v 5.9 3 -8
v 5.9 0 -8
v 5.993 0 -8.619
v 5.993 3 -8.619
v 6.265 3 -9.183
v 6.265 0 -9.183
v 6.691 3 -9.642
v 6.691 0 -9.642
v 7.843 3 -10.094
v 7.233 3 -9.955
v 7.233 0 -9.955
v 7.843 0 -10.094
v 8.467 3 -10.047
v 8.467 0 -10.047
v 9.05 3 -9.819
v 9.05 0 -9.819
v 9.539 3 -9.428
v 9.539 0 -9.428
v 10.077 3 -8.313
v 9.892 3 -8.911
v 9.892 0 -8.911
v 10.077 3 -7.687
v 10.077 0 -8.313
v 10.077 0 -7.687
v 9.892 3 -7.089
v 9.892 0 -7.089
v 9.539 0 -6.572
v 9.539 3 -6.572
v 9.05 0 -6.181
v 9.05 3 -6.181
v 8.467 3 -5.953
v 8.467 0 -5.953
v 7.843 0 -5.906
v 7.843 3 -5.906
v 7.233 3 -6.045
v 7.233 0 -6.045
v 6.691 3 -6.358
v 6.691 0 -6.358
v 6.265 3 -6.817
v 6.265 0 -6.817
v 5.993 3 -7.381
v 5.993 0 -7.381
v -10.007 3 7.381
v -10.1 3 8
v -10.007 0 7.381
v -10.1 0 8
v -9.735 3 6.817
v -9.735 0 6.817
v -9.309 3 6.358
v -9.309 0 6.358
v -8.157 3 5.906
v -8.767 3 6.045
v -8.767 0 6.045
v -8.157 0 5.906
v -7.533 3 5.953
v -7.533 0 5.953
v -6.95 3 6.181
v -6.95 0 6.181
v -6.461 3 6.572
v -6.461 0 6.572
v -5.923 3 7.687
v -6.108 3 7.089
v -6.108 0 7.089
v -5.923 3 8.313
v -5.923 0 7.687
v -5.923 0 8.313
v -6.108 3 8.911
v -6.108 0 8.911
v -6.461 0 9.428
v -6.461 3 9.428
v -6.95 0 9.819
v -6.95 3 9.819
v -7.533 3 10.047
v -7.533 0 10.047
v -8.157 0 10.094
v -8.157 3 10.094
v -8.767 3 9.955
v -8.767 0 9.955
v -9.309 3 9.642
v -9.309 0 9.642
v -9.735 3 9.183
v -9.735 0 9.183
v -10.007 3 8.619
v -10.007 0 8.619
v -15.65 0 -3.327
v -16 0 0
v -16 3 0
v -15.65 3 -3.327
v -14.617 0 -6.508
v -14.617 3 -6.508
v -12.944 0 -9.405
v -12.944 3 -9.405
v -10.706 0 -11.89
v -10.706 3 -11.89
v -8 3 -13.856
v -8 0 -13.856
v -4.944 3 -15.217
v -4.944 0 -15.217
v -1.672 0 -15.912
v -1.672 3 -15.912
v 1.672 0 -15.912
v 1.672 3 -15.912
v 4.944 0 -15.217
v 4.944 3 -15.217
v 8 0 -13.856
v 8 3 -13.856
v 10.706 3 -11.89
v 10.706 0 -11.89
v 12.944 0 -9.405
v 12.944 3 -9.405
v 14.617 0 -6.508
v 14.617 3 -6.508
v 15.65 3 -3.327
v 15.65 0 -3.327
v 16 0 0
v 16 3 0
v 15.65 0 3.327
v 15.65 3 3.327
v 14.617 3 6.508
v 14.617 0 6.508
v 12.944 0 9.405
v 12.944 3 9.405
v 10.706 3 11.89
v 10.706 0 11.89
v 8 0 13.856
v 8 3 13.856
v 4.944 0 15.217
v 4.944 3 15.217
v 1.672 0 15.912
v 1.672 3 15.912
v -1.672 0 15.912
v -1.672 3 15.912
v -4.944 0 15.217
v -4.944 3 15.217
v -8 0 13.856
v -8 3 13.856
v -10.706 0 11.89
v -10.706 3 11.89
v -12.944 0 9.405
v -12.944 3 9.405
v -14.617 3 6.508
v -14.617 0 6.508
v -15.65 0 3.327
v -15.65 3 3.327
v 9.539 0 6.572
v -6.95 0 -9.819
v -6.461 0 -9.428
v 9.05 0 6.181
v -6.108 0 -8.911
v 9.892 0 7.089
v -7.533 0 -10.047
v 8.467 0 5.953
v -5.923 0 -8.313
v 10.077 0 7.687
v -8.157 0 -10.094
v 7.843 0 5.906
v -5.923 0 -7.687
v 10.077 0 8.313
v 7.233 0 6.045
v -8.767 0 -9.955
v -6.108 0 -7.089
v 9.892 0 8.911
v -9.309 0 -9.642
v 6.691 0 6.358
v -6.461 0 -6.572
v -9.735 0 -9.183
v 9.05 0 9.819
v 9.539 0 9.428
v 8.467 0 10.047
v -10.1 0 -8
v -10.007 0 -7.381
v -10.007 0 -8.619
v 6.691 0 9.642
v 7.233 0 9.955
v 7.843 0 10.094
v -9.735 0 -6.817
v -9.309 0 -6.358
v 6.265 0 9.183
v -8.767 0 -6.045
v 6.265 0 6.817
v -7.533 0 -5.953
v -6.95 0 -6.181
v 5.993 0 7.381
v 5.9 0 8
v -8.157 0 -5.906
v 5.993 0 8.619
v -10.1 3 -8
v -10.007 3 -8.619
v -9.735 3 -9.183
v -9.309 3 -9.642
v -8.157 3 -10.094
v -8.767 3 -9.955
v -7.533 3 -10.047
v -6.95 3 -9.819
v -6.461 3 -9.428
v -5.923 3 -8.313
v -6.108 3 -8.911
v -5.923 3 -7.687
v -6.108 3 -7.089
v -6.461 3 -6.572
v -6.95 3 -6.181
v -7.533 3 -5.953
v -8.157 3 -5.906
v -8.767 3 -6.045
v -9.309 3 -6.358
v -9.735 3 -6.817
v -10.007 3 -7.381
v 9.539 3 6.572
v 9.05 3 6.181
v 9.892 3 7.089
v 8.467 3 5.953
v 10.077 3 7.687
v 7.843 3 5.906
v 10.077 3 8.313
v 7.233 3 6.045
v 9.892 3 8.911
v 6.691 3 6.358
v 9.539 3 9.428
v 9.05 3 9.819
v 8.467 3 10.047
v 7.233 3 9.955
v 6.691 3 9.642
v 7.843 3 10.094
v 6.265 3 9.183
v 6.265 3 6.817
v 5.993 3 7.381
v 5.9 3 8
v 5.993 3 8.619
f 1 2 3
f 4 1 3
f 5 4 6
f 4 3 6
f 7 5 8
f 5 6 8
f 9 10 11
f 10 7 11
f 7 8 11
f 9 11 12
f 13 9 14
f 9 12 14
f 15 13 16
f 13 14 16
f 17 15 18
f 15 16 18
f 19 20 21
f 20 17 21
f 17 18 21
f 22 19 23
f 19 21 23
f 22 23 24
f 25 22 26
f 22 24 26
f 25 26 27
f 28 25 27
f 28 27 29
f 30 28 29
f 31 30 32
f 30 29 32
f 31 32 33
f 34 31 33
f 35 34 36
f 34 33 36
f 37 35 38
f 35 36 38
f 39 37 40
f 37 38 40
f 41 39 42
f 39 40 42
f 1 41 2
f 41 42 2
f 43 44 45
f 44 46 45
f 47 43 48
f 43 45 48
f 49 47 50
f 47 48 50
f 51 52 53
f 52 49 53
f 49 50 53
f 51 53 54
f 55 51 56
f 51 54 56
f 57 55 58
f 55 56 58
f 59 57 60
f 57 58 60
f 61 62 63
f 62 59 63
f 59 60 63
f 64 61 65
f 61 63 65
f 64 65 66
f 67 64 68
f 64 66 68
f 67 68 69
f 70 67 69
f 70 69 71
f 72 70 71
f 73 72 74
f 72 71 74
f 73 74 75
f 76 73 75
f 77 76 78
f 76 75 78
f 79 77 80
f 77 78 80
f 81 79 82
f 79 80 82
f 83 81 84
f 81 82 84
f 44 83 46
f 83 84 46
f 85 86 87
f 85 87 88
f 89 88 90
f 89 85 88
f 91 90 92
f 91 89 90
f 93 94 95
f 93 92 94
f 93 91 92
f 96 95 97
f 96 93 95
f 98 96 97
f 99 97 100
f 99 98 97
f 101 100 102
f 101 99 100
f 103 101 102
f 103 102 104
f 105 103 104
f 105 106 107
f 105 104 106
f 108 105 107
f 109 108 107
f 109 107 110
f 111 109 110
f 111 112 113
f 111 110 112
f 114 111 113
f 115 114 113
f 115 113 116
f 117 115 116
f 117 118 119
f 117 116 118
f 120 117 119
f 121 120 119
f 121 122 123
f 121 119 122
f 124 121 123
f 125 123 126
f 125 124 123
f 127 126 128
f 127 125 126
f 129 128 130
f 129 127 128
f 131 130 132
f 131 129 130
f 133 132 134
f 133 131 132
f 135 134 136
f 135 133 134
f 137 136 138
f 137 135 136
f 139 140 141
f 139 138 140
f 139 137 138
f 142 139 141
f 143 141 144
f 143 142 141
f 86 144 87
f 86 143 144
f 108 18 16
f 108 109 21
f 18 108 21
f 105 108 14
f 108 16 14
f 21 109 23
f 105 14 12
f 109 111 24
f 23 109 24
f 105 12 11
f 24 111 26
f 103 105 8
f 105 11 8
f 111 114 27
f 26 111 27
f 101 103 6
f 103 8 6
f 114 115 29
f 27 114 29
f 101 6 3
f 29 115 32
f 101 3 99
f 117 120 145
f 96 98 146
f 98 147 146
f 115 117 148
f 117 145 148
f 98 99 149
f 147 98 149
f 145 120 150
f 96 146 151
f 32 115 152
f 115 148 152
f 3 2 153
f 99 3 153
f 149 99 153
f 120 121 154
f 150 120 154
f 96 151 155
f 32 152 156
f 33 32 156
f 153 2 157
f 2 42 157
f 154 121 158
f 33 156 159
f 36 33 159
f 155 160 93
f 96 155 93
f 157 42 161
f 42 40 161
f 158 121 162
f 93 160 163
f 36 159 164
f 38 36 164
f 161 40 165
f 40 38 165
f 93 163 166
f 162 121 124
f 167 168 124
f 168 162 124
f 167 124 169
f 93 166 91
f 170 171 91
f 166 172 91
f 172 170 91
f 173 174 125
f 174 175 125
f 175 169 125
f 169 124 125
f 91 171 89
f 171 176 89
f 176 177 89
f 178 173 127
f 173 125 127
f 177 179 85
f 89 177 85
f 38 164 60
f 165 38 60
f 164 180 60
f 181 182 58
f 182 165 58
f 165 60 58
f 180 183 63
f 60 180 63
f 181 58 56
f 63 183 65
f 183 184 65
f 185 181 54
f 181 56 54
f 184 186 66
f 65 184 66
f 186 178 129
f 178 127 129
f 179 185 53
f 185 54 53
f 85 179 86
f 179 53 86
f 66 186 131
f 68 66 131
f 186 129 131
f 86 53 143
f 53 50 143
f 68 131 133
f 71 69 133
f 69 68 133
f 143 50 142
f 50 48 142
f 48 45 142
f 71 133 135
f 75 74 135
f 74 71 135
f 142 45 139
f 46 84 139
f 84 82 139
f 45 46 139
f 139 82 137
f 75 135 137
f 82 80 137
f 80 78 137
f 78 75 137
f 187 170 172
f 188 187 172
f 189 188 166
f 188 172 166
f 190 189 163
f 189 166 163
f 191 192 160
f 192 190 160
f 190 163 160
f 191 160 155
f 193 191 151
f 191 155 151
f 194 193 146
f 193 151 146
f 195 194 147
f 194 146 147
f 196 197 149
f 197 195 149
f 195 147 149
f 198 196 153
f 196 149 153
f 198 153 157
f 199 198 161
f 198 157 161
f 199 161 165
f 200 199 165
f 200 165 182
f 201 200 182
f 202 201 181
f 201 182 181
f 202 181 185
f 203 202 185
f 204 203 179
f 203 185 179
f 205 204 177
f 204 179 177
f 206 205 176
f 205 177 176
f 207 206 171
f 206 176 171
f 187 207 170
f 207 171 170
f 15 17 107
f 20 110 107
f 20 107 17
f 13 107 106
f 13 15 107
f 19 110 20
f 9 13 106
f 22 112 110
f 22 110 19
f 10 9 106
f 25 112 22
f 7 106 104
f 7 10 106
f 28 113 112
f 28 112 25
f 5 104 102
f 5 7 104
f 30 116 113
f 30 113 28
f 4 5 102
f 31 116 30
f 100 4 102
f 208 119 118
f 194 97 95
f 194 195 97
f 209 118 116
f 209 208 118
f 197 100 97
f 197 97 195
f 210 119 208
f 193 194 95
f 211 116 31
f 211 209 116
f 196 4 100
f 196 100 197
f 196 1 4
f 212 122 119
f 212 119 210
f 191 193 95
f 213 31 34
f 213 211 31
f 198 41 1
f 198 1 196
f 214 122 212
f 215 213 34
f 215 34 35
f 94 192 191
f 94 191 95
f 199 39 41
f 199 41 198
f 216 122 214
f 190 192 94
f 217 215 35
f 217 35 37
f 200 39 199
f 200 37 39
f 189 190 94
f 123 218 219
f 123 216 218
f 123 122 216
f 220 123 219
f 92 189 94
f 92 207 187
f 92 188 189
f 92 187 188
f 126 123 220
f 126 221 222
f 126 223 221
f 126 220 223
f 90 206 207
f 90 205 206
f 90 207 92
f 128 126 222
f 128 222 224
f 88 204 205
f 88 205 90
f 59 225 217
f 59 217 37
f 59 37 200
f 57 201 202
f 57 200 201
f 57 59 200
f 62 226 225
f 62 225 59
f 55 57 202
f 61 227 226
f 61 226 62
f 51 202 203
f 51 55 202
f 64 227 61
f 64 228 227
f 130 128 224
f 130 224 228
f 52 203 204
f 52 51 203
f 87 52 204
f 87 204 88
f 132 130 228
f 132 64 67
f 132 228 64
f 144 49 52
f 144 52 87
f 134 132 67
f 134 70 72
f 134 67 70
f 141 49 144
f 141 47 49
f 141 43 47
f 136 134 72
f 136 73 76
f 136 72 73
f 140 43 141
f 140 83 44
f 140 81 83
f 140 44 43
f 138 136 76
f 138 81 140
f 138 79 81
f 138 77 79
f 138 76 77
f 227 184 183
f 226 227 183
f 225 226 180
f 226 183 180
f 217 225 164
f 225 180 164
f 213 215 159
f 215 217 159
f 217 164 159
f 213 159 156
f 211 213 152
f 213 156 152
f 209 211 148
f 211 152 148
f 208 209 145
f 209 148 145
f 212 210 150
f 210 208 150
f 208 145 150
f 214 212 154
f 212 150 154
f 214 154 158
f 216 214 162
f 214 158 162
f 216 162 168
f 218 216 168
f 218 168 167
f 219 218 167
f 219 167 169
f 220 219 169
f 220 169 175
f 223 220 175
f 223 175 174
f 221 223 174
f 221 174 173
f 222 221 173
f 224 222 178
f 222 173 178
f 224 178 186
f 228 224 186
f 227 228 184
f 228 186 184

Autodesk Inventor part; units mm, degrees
ref_plane "YZ Plane" through (0, 0, 0) normal (1, 0, 0) x (0, 1, 0)
ref_plane "XZ Plane" through (0, 0, 0) normal (0, 1, 0) x (-1, 0, 0)
ref_plane "XY Plane" through (0, 0, 0) normal (0, 0, 1) x (1, 0, 0)
sketch "Sketch1" plane through (0, 0, 0) normal (0, 1, 0) x (-1, 0, 0)
  circle A0 centre (0, 0) radius 16
  circle A1 centre (8, -8) radius 2.1
  circle A2 centre (8, 8) radius 2.1
  circle A3 centre (-8, 8) radius 2.1
  circle A4 centre (-8, -8) radius 2.1
  dimension "d0" = 32
  dimension "d1" = 4.2
  dimension "d2" = 8
  dimension "d3" = 8
  dimension "d6" = 360
extrude "Extrusion1" add sketch "Sketch1" along normal blind 3
properties part number "WristSpaacer"
